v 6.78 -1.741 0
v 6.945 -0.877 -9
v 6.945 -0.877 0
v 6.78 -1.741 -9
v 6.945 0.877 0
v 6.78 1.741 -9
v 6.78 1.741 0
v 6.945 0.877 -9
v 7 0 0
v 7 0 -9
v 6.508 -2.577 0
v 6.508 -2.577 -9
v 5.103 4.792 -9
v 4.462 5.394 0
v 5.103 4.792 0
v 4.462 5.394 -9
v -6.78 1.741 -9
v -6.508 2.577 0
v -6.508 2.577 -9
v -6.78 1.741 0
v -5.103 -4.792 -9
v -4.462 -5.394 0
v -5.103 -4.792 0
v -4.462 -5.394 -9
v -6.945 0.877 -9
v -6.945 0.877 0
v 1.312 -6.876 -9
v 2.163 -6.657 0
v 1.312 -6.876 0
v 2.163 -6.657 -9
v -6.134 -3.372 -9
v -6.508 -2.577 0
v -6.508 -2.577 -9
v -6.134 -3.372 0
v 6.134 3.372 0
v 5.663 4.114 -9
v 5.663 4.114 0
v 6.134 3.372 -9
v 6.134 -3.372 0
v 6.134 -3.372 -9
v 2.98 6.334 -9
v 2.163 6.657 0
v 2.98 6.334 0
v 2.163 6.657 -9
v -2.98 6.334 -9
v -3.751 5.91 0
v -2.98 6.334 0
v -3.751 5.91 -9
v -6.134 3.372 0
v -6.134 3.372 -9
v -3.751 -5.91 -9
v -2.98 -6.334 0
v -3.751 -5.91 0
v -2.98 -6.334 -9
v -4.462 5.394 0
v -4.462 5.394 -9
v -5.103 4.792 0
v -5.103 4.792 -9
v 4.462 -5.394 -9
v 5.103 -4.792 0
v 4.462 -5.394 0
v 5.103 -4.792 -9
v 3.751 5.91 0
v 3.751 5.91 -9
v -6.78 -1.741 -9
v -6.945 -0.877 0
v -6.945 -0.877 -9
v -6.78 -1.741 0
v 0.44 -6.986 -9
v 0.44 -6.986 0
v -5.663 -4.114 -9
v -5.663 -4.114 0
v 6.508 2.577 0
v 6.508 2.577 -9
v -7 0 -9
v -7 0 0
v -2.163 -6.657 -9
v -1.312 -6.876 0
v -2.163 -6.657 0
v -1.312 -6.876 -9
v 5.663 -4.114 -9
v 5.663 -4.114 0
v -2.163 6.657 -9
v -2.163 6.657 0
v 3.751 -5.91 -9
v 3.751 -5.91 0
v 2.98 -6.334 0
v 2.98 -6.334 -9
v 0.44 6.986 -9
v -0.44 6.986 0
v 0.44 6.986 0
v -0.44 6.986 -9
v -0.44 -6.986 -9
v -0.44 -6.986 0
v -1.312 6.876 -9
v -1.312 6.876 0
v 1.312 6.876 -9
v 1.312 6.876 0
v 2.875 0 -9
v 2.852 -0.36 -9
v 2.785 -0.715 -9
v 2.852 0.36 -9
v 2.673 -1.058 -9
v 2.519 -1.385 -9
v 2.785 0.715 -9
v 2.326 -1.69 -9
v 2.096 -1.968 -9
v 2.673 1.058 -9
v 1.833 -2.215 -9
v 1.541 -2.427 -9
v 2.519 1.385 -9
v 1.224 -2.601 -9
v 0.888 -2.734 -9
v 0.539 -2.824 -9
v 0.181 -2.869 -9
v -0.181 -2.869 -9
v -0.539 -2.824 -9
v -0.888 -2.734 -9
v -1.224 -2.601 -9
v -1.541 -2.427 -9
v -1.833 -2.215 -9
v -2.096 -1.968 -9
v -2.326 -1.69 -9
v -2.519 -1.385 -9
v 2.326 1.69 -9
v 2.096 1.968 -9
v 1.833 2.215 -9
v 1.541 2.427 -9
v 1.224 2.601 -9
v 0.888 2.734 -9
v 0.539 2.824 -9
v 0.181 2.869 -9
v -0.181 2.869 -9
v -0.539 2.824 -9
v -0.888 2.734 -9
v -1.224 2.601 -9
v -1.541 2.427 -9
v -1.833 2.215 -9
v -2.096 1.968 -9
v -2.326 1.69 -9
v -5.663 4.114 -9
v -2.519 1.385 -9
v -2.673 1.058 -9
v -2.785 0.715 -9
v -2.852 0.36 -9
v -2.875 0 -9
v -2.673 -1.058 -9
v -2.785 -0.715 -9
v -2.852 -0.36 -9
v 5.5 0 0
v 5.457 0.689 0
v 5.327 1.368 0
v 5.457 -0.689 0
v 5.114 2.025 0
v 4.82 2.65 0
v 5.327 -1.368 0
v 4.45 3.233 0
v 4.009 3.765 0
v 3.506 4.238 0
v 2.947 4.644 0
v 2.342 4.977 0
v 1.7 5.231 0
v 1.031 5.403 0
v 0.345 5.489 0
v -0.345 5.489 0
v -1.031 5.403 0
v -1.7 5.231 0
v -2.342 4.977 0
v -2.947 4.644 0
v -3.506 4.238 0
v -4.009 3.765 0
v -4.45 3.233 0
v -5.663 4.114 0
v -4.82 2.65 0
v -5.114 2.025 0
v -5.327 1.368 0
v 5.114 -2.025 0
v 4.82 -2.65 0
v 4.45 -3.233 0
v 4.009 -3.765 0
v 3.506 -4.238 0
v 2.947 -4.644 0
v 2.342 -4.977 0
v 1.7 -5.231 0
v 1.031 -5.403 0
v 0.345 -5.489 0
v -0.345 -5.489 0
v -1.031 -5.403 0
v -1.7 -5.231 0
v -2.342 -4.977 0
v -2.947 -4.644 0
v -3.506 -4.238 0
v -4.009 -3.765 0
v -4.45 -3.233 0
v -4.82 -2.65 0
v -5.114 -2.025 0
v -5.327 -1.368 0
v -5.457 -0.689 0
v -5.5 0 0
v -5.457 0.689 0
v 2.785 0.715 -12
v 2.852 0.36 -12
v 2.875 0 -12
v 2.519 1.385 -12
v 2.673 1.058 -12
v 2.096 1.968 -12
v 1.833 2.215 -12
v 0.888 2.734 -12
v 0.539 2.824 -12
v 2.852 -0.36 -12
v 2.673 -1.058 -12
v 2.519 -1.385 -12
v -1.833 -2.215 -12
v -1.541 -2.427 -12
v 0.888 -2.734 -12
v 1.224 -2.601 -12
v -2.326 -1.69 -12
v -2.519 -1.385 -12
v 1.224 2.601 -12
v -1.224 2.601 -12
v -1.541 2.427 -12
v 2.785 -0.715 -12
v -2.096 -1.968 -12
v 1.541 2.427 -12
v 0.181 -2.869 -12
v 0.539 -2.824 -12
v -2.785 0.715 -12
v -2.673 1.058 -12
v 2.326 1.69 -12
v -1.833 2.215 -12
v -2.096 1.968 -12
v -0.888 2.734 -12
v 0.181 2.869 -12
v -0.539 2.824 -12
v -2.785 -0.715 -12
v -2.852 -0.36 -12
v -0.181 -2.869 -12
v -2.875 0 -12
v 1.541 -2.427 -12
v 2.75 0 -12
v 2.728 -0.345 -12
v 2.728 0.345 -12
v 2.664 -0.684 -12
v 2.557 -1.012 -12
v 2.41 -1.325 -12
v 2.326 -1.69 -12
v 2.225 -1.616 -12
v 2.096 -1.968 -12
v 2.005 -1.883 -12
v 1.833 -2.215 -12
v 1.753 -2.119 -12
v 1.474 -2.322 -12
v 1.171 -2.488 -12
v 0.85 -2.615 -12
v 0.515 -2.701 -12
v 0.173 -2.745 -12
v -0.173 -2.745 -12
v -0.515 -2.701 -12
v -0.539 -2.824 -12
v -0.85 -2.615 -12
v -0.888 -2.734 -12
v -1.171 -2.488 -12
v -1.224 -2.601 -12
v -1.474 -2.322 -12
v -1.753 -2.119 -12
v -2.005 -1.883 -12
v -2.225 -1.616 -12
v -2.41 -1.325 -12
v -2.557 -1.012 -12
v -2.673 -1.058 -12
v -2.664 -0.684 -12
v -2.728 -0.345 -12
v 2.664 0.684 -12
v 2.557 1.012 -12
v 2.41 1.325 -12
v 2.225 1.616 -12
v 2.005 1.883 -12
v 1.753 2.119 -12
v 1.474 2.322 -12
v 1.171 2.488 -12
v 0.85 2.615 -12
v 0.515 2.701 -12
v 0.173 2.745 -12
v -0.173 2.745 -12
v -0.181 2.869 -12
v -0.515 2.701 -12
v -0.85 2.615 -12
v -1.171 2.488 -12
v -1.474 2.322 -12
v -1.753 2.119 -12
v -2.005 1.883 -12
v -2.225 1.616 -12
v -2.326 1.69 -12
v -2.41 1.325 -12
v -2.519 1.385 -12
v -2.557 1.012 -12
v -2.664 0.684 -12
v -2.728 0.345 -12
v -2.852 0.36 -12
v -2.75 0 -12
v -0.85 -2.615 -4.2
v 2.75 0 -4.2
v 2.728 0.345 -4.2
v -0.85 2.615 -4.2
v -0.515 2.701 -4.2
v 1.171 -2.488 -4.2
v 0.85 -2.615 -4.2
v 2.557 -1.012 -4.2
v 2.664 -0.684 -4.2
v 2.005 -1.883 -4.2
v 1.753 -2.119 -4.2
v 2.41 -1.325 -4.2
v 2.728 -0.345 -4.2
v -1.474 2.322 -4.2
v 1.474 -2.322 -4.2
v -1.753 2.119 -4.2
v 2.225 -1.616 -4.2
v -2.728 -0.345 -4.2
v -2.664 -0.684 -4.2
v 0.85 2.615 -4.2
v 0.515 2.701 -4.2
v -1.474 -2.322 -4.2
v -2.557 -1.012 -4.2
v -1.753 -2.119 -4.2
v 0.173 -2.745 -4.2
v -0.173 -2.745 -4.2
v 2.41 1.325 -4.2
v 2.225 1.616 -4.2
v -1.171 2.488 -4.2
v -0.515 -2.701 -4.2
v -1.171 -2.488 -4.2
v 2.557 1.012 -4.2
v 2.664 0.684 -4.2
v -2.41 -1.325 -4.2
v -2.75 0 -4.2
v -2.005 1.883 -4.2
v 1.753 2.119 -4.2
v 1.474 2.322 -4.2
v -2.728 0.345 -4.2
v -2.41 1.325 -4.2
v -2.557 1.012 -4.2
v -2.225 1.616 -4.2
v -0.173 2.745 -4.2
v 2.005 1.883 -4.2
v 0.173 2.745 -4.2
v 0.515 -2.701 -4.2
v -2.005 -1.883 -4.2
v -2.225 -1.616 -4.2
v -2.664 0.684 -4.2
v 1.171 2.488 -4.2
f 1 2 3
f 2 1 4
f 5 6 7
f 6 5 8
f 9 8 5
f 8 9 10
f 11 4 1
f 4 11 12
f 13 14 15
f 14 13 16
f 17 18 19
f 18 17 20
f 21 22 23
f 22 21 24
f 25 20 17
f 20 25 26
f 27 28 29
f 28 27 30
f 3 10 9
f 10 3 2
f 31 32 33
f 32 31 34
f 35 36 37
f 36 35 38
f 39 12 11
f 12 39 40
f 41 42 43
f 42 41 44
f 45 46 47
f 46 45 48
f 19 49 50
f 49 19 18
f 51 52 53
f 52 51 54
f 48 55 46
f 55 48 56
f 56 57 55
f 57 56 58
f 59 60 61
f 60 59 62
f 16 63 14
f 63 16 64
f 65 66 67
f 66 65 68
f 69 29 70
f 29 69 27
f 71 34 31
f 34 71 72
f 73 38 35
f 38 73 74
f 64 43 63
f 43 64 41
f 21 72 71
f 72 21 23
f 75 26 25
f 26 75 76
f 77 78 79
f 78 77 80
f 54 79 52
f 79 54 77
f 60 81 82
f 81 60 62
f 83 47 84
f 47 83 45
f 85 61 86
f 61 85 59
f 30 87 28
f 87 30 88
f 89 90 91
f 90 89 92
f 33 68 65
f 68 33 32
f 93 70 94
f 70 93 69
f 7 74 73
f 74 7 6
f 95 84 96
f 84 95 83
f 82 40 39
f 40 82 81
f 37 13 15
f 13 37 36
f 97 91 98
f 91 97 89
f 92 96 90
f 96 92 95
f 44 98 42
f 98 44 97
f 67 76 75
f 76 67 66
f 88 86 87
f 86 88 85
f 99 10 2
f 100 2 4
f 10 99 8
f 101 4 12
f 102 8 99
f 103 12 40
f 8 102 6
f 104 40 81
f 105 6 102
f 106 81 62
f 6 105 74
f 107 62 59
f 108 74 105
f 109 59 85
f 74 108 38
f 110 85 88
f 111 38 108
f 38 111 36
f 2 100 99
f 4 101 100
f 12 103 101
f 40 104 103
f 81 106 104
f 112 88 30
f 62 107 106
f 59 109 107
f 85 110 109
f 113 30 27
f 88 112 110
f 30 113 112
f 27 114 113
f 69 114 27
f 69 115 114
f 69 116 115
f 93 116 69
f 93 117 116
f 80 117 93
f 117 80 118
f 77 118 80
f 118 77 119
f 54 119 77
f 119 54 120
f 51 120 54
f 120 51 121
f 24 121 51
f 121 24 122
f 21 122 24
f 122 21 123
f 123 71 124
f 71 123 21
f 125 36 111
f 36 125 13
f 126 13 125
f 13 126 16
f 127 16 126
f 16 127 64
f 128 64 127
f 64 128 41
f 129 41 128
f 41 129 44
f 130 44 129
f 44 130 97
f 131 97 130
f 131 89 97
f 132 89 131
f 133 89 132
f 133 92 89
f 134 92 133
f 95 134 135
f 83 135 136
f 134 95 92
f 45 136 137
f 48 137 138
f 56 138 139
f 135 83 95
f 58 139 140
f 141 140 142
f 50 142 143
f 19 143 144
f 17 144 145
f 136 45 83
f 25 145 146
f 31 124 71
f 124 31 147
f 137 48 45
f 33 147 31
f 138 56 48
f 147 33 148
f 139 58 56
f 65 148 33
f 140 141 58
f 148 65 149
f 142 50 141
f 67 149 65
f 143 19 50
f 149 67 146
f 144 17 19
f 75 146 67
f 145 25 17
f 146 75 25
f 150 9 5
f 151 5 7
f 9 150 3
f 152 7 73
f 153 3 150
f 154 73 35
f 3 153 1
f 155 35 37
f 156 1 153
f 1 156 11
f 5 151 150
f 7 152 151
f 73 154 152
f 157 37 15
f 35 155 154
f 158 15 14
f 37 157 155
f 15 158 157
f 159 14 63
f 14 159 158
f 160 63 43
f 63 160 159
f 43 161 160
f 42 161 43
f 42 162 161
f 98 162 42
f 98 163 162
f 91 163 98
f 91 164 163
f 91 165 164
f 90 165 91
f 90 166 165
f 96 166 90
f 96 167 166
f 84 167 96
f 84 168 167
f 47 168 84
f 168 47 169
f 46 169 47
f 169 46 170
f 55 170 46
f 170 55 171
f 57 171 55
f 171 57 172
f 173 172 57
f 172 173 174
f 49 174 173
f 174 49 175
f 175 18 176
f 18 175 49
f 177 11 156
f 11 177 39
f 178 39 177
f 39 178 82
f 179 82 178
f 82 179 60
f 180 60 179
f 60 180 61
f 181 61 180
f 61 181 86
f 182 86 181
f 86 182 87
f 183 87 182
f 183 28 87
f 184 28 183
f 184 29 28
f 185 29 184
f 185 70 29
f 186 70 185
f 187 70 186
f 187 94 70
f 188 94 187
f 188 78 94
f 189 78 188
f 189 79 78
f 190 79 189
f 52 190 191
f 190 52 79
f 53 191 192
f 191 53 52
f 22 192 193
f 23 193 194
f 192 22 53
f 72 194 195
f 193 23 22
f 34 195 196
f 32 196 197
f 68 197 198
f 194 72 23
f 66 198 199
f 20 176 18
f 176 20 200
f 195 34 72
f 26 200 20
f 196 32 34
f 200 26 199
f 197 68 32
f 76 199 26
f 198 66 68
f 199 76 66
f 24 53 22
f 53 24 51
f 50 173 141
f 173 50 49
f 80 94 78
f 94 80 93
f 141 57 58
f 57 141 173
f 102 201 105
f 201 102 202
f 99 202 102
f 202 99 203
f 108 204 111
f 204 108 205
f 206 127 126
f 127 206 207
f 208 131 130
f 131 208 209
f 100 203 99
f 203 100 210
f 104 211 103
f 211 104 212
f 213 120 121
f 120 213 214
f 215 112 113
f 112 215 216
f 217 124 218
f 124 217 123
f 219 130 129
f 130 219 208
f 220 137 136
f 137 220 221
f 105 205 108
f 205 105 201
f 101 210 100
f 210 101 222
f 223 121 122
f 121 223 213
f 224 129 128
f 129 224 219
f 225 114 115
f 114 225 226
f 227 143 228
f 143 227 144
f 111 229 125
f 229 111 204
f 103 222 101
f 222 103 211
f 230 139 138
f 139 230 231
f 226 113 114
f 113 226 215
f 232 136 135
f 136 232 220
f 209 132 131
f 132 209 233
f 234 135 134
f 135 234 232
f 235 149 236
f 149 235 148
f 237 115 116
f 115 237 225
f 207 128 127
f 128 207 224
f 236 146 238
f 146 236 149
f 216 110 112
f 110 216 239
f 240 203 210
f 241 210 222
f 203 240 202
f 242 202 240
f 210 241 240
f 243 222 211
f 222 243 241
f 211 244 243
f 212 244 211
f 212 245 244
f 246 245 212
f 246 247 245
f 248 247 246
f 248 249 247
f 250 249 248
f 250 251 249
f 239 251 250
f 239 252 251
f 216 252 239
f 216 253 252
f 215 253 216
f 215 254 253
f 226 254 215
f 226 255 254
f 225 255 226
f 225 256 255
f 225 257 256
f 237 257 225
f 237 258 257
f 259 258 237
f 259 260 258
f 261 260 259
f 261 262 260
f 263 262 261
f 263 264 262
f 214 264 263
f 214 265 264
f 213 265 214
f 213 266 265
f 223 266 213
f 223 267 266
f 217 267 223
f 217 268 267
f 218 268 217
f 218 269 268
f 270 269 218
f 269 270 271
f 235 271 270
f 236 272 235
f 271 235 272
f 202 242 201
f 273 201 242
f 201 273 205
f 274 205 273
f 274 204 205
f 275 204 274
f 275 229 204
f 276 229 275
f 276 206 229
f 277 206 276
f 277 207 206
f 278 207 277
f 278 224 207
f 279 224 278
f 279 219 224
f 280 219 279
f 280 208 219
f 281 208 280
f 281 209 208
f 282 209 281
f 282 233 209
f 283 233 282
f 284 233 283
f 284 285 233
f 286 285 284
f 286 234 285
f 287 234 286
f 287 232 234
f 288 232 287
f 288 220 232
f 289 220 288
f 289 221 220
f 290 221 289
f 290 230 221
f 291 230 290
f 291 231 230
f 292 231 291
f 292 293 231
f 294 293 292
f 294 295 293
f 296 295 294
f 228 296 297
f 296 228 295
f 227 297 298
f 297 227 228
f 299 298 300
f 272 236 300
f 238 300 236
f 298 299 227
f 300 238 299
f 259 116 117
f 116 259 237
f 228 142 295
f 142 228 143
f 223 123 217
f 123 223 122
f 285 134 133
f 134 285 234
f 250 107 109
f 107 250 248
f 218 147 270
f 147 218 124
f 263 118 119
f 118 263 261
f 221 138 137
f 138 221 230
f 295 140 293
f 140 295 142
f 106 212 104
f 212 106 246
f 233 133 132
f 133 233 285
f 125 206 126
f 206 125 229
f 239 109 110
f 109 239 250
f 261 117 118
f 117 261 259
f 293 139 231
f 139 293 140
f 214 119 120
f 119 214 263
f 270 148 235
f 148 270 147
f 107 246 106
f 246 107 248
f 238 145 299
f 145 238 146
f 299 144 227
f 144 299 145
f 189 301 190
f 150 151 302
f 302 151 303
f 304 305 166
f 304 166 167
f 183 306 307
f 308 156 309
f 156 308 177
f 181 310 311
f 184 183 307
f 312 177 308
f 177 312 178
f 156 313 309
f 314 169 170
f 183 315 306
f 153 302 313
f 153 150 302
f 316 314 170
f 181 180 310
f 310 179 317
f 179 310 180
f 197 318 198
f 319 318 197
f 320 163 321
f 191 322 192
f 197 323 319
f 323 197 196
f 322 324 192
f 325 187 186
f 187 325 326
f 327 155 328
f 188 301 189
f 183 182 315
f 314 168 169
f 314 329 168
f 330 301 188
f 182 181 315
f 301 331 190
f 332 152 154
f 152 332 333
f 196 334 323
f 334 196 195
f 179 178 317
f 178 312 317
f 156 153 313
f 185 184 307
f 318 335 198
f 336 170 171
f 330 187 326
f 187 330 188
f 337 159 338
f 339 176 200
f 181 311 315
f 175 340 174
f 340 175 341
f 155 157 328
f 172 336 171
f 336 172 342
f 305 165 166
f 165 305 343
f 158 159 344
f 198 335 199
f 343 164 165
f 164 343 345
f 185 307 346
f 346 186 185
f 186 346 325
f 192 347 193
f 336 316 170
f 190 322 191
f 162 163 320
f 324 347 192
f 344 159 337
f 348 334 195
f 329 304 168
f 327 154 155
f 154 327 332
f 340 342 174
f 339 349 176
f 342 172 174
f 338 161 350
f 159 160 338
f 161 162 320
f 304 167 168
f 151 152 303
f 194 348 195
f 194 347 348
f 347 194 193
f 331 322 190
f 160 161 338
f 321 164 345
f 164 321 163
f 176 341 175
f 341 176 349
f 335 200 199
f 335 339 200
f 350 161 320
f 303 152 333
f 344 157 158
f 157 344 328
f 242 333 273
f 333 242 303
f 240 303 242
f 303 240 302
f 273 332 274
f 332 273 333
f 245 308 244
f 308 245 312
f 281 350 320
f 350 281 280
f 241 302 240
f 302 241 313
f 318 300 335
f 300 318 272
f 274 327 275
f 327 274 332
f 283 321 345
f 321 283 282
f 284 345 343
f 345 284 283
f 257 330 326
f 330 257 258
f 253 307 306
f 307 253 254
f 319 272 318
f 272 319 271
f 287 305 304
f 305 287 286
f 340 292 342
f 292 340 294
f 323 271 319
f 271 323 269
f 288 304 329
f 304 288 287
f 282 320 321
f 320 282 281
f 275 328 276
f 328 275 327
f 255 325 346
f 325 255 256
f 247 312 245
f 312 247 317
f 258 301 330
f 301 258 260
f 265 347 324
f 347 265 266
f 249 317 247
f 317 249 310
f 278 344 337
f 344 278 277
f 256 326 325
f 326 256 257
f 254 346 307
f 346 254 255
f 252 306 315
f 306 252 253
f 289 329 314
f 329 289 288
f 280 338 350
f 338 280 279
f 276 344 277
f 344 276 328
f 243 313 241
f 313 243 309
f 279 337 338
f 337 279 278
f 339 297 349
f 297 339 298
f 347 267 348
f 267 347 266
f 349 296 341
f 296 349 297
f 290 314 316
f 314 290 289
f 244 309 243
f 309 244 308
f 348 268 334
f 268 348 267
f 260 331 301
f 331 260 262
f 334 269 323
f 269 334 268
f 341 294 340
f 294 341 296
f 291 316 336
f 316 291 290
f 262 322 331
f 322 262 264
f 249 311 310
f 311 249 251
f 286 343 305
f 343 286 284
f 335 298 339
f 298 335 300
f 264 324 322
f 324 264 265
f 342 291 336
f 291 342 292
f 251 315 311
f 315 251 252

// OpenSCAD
$fn = 50;


difference() {
	union() {
		translate(v = [0, 0, -9.0000000000]) {
			cylinder(h = 9, r = 7.0000000000);
		}
		#translate(v = [0, 0, -12.0000000000]) {
			cylinder(h = 12, r = 2.8750000000);
		}
	}
	union() {
		translate(v = [0, 0, 0]) {
			rotate(a = [0, 0, 0]) {
				difference() {
					union() {
						translate(v = [0, 0, -12.0000000000]) {
							cylinder(h = 12, r = 2.2500000000);
						}
						translate(v = [0, 0, -4.2000000000]) {
							cylinder(h = 4.2000000000, r1 = 2.7500000000, r2 = 5.5000000000);
						}
						translate(v = [0, 0, -12.0000000000]) {
							cylinder(h = 12, r = 2.7500000000);
						}
						translate(v = [0, 0, -12.0000000000]) {
							cylinder(h = 12, r = 2.2500000000);
						}
					}
					union();
				}
			}
		}
	}
}
